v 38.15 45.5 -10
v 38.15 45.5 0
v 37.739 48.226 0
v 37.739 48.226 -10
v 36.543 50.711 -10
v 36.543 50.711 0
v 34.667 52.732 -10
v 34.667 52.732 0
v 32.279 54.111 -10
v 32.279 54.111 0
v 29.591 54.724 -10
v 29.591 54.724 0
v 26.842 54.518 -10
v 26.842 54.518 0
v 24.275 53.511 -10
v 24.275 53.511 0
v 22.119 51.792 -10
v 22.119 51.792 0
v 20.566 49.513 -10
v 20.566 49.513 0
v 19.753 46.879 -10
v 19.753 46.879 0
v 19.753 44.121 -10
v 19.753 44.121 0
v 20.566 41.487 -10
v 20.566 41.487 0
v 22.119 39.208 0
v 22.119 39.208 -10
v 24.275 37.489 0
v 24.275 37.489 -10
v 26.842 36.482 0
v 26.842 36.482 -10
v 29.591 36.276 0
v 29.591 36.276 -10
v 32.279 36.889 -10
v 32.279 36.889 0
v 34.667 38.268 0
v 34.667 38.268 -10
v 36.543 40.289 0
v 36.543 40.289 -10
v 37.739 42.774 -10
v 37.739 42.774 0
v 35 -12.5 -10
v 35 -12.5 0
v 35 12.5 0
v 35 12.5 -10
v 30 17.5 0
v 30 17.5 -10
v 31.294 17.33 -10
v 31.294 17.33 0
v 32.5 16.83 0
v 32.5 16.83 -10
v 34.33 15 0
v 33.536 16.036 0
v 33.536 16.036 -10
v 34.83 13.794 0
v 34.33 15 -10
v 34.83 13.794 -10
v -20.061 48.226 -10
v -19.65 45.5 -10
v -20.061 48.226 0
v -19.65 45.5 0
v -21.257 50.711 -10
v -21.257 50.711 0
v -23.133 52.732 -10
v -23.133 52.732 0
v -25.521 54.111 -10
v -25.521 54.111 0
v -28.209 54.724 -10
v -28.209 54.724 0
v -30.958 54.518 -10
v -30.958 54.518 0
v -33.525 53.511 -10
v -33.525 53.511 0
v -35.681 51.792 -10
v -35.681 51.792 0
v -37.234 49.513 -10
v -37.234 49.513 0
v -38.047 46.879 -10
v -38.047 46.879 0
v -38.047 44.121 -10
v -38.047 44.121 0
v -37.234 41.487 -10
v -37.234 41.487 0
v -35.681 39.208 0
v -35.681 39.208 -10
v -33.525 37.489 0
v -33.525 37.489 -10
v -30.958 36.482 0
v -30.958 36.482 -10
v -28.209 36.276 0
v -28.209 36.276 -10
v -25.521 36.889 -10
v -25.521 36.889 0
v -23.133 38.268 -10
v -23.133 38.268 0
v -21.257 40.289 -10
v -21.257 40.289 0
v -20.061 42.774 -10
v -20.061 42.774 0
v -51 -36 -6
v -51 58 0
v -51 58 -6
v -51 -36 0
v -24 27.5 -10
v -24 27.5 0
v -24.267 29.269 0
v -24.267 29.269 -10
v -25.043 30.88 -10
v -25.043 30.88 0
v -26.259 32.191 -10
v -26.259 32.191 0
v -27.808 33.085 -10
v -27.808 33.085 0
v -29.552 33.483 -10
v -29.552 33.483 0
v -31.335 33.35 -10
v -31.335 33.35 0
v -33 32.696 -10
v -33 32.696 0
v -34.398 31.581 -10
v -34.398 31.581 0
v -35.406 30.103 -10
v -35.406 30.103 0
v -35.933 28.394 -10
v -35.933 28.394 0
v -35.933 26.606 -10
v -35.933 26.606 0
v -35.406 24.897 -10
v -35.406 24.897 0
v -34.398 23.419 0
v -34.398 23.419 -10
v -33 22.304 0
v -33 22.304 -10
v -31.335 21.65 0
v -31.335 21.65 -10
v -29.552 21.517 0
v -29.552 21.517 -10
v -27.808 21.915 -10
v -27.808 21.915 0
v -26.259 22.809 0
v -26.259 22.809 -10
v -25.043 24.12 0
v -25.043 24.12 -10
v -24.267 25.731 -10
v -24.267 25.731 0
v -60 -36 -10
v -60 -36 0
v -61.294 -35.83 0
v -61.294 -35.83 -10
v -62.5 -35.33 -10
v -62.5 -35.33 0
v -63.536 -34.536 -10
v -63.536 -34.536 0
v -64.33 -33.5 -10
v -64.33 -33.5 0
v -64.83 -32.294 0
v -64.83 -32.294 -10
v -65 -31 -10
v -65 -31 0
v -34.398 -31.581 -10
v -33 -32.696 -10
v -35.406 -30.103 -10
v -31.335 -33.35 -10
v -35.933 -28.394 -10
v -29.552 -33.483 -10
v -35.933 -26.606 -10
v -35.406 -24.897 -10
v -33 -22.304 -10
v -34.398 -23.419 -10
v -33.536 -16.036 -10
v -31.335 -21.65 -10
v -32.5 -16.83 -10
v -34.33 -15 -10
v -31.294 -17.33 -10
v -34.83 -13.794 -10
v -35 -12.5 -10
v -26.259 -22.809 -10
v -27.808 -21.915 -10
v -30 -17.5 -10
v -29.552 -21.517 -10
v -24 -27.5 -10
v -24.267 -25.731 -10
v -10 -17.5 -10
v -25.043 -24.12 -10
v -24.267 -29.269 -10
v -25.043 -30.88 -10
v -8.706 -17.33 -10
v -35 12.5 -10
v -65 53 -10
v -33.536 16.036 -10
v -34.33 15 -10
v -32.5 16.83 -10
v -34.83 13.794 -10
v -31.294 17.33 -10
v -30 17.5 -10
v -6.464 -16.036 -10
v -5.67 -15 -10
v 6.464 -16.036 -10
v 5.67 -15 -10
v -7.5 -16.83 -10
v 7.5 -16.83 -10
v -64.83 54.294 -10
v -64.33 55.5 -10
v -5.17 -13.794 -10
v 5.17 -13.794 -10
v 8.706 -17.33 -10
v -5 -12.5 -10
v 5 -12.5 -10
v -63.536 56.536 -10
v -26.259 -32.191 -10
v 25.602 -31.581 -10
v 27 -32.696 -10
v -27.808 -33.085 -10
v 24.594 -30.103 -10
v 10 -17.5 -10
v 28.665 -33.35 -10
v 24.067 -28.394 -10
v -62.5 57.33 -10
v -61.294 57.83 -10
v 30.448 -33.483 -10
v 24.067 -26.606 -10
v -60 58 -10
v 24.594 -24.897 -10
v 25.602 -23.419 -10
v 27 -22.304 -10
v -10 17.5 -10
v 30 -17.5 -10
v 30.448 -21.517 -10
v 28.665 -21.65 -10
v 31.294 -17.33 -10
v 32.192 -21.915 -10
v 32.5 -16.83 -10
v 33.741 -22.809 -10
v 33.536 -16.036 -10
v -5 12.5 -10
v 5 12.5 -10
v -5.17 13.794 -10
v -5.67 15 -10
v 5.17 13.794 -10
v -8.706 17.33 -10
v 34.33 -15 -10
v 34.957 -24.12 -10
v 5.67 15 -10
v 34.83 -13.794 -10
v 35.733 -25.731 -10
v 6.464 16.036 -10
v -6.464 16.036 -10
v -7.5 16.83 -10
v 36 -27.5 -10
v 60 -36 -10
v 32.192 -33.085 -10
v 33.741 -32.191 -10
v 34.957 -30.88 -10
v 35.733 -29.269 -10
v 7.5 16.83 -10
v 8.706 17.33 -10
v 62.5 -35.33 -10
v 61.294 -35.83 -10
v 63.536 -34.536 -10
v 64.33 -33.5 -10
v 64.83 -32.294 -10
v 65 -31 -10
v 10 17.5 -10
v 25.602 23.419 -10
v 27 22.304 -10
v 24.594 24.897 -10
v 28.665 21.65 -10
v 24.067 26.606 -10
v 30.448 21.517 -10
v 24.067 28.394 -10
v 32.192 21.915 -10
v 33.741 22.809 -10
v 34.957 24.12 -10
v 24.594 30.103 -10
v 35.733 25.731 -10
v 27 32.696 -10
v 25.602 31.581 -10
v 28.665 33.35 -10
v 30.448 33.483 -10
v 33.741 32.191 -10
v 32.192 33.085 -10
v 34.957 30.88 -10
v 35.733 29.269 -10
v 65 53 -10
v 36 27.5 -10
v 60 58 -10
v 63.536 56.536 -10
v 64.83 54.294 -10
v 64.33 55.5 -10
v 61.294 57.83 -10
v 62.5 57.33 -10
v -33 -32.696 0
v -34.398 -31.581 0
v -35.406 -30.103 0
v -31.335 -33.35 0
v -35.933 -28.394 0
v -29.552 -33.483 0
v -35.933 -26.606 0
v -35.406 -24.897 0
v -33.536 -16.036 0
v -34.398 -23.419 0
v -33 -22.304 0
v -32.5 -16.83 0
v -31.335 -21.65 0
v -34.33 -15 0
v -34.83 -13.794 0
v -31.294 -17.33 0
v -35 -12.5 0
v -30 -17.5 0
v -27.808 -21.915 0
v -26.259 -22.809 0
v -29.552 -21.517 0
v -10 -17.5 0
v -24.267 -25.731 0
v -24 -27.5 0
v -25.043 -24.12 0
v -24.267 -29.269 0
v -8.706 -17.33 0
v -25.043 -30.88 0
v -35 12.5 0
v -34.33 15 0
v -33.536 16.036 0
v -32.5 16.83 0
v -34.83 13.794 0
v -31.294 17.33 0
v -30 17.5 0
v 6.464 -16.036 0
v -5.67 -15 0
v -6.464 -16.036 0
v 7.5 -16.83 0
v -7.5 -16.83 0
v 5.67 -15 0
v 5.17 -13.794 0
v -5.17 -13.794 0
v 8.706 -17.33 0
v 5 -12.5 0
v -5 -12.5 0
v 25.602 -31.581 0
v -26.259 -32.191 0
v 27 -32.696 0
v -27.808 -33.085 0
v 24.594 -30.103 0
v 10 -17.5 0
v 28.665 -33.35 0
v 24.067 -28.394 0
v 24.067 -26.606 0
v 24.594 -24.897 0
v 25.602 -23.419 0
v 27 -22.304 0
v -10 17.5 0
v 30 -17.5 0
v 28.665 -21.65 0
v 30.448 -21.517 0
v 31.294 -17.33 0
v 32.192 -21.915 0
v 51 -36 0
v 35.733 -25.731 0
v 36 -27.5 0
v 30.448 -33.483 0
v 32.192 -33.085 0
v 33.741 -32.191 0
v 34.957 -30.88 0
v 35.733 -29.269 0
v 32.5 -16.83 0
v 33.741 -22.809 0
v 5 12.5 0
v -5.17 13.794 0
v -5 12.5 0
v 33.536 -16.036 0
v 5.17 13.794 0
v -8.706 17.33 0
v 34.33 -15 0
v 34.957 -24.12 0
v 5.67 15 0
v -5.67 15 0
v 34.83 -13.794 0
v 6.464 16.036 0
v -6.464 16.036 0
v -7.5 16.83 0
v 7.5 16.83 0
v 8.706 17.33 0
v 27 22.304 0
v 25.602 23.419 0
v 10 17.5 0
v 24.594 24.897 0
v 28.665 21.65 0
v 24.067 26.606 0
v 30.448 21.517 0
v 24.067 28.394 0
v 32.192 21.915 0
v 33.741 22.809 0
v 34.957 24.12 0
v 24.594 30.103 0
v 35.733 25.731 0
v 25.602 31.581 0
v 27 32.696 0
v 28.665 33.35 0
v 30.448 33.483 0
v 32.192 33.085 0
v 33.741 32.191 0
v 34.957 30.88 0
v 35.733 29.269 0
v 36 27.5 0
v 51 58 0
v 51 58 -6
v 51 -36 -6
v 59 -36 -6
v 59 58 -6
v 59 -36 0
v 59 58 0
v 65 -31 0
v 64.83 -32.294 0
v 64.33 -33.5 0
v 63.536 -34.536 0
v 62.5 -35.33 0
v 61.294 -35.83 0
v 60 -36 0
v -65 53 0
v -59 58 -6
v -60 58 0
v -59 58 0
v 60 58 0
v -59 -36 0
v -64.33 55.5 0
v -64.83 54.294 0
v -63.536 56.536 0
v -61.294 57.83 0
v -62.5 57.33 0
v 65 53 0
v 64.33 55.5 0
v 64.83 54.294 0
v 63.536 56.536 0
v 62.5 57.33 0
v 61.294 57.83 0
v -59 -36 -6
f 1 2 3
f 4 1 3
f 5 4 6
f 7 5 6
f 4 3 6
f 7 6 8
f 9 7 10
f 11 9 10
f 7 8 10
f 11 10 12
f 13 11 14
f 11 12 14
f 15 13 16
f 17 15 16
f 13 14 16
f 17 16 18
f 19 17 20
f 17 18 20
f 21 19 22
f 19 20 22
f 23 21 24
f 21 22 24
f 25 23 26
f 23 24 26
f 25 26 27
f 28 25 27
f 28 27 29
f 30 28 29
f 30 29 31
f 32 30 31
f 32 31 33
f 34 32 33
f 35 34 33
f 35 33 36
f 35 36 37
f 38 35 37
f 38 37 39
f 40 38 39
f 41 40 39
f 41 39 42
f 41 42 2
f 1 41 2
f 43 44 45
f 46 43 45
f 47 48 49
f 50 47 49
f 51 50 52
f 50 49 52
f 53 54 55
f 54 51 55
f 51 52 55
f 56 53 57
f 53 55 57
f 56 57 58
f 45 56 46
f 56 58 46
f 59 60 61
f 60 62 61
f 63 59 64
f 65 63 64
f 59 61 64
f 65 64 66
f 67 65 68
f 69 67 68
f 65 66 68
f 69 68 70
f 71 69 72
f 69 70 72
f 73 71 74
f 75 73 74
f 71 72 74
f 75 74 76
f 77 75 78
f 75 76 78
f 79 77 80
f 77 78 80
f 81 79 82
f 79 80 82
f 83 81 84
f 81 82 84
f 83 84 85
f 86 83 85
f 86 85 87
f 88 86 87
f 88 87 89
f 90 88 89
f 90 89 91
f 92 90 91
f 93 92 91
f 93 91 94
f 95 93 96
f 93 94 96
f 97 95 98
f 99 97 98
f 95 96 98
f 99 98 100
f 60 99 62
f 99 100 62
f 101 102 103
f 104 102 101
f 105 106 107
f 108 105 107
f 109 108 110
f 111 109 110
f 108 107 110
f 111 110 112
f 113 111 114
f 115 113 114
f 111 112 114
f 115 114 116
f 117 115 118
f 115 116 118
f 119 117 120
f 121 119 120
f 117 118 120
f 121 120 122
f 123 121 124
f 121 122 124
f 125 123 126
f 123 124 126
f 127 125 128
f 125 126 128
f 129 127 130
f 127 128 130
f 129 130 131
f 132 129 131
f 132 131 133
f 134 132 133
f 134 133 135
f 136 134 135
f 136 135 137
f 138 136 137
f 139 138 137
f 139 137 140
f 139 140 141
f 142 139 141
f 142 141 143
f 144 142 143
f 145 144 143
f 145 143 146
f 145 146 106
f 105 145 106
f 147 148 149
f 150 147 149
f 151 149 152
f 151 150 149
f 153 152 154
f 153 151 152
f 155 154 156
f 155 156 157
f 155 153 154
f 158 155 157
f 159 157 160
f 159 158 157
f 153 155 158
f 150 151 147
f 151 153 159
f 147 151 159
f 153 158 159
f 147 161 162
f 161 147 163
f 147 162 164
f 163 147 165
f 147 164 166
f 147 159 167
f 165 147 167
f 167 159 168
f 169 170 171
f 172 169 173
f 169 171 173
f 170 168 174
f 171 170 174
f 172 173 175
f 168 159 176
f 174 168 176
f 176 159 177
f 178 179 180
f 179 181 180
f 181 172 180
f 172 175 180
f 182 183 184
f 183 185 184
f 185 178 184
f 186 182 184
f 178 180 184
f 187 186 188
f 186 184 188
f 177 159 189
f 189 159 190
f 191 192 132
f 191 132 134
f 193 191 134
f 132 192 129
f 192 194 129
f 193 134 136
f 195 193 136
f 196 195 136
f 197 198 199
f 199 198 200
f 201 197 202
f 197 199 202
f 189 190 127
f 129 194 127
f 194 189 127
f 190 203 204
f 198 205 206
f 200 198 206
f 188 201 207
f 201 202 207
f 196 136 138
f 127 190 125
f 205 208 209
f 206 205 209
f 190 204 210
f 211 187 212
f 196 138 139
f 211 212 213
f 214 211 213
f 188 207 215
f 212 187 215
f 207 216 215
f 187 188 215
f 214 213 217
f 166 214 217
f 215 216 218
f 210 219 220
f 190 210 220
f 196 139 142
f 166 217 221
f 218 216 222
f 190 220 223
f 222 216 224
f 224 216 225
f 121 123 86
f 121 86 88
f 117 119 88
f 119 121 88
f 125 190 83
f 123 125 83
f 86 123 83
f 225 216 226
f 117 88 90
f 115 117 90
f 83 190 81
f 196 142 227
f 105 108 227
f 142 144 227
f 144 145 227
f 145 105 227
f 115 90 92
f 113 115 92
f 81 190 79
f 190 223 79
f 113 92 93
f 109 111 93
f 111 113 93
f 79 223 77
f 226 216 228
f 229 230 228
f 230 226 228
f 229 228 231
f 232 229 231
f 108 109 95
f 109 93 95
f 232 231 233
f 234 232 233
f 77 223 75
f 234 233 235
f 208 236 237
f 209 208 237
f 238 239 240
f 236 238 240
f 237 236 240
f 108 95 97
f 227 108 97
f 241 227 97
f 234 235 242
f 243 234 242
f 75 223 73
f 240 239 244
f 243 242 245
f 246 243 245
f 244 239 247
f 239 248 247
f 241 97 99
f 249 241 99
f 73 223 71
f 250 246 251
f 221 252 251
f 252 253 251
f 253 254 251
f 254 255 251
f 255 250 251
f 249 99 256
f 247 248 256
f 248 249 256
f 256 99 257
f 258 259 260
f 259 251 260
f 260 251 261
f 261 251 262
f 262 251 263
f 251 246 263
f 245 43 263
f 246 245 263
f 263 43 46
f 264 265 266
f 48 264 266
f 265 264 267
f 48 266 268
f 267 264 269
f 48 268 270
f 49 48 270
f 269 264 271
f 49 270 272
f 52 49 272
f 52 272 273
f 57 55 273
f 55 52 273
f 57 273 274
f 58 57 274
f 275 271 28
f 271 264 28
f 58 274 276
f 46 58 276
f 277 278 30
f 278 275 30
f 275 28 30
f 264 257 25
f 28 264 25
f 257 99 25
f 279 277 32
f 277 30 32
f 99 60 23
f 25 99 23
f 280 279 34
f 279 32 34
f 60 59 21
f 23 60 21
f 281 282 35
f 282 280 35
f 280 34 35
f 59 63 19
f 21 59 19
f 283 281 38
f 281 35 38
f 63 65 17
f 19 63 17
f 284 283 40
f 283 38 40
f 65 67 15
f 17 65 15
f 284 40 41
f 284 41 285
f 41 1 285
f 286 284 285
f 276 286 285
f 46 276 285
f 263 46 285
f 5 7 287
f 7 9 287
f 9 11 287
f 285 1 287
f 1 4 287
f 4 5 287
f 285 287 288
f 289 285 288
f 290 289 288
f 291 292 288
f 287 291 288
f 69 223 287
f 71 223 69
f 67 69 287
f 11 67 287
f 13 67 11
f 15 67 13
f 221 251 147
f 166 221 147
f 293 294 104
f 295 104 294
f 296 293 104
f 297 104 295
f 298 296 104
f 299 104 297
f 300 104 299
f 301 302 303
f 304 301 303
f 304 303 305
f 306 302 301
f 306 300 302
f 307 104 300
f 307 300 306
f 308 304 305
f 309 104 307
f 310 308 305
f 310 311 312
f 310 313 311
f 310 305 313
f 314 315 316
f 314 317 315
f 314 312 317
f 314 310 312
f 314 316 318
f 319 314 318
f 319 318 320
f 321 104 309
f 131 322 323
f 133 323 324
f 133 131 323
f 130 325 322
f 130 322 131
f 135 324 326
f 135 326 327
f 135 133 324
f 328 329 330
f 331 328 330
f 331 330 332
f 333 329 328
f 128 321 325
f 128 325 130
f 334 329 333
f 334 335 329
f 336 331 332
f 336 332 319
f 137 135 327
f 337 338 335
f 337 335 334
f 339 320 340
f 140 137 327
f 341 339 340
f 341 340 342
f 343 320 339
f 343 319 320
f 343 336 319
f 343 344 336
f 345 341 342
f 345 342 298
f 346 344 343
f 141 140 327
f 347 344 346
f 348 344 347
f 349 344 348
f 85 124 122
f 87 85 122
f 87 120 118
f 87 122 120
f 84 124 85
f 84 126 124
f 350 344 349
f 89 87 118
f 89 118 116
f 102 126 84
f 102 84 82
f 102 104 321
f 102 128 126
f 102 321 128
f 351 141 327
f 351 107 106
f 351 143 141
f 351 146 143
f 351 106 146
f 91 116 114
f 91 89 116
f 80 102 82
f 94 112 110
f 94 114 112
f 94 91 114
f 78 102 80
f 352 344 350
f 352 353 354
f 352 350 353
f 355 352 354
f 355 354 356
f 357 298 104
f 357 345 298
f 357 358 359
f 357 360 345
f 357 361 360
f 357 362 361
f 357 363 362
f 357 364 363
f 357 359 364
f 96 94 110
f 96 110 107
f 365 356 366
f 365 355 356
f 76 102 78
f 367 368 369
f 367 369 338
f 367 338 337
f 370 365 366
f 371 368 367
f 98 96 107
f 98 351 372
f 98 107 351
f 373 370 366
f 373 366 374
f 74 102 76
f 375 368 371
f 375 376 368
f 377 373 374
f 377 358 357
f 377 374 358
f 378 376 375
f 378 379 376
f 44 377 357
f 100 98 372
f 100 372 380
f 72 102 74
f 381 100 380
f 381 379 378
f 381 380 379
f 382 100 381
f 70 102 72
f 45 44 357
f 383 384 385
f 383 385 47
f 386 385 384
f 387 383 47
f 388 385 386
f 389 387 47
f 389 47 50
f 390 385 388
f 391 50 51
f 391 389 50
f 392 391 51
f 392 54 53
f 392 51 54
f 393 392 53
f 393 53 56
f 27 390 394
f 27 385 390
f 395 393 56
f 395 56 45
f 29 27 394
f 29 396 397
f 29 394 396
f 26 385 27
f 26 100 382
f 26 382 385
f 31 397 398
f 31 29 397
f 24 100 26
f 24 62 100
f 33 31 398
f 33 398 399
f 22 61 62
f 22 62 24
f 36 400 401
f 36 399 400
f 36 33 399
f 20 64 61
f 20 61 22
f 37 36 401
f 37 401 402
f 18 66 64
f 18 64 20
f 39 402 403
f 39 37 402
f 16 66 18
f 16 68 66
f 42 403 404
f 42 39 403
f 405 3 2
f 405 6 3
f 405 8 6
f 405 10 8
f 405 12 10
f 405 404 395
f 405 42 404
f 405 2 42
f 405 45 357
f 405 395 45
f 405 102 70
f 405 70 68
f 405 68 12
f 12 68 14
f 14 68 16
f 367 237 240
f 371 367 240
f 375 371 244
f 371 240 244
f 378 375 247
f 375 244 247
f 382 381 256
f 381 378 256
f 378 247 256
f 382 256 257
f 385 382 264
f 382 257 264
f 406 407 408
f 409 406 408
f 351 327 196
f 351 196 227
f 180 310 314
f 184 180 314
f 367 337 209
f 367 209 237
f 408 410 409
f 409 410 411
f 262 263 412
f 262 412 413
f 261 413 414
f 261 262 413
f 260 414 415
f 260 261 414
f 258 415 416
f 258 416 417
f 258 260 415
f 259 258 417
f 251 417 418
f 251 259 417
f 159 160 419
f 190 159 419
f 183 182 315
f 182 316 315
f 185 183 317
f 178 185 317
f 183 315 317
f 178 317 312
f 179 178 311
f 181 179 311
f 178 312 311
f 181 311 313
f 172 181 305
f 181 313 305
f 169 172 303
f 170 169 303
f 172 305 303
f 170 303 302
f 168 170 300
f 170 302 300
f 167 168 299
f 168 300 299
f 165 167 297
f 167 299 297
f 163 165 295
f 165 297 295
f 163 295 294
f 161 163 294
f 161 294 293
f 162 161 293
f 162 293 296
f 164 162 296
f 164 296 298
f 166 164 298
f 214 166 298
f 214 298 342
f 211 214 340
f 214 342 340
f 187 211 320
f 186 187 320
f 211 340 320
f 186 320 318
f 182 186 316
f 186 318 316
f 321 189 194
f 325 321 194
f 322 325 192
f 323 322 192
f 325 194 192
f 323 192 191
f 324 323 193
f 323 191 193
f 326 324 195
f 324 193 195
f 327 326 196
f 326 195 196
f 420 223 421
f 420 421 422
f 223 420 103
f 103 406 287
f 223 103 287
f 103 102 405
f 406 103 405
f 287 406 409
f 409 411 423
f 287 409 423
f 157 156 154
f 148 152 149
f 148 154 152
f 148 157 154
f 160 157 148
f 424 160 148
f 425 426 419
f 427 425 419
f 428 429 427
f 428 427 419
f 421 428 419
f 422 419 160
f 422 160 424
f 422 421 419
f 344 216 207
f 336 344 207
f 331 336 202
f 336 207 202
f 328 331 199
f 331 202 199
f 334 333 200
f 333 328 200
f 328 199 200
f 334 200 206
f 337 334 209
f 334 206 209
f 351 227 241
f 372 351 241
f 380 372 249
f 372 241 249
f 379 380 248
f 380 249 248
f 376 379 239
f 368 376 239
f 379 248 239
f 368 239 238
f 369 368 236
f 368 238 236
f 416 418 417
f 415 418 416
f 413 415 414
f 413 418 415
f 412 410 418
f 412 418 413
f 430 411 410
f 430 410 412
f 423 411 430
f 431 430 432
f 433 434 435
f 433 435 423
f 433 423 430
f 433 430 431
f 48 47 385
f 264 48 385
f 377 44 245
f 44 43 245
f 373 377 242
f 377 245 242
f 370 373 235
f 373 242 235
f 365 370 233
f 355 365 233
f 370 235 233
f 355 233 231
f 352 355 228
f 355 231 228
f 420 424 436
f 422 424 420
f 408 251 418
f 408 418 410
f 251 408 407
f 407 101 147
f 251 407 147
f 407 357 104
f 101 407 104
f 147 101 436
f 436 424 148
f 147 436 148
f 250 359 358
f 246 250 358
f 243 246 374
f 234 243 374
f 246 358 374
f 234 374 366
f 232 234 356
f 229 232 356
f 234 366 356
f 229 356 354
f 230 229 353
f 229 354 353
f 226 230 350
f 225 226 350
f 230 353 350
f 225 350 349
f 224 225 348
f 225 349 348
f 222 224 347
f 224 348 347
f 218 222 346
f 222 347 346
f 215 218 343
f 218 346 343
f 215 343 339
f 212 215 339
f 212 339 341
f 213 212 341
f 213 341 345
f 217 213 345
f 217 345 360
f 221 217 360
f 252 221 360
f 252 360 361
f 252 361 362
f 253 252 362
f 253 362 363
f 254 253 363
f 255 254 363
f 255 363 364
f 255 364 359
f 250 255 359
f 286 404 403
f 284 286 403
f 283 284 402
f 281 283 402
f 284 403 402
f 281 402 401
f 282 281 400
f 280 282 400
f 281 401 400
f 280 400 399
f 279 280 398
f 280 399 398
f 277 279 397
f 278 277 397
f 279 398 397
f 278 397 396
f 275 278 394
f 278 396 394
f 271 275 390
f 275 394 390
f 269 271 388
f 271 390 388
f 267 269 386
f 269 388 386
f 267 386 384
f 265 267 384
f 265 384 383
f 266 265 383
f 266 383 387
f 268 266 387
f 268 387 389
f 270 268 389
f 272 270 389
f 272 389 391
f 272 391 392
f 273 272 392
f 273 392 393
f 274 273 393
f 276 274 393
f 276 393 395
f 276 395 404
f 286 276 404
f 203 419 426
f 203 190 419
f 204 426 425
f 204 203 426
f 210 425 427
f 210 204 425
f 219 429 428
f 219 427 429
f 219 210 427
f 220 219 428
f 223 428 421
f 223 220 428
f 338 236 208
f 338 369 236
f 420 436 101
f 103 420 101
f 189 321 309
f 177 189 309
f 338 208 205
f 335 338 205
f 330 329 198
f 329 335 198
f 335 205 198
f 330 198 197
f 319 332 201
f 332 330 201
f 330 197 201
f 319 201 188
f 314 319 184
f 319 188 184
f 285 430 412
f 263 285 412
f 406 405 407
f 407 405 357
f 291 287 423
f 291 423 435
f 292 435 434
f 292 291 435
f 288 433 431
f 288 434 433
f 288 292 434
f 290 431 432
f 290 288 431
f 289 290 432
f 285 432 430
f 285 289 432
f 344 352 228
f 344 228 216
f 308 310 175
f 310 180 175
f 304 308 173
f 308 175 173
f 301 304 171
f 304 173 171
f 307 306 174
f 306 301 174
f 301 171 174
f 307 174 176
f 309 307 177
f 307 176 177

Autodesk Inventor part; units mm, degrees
ref_plane "YZ Plane" through (0, 0, 0) normal (1, 0, 0) x (0, 1, 0)
ref_plane "XZ Plane" through (0, 0, 0) normal (0, 1, 0) x (-1, 0, 0)
ref_plane "XY Plane" through (0, 0, 0) normal (0, 0, 1) x (1, 0, 0)
sketch "Sketch1" plane through (0, 0, 0) normal (0, 0, 1) x (1, 0, 0)
  line L0 (-91, 0) -> (91, 0) construction
  line L1 (0, -94.2771) -> (0, 159.6624) construction
  circle A0 centre (-30, 27.5) radius 6
  circle A1 centre (30, 27.5) radius 6
  line L2 (-30, 27.5) -> (30, 27.5) construction
  line L3 (30, 27.5) -> (30, -27.5) construction
  line L4 (30, -27.5) -> (-30, -27.5) construction
  line L5 (-30, -27.5) -> (-30, 27.5) construction
  circle A2 centre (-30, -27.5) radius 6
  circle A3 centre (30, -27.5) radius 6
  line L6 (-30, 17.5) -> (-5, 17.5)
  line L7 (-5, 17.5) -> (-5, -17.5)
  line L8 (-5, -17.5) -> (-30, -17.5)
  circle A4 centre (-30, 0) radius 5
  circle A5 centre (-13, 7.5) radius 5.5
  circle A6 centre (-13, -7.5) radius 5.5
  line L9 (-45, 36) -> (45, 36)
  line L10 (45, 36) -> (45, -36)
  line L11 (45, -36) -> (-45, -36)
  line L12 (-45, -36) -> (-45, 36)
  circle A7 centre (-28.9, 45.5) radius 9.25
  circle A8 centre (28.9, 45.5) radius 9.25
  circle A9 centre (-28.9, -45.5) radius 9.25 construction
  circle A10 centre (28.9, -45.5) radius 9.25 construction
  line L13 (-30, 17.5) -> (-35, 17.5)
  line L14 (-35, 17.5) -> (-35, -17.5)
  line L15 (-35, -17.5) -> (-30, -17.5)
  line L16 (-45, 58) -> (45, 58)
  line L17 (45, 58) -> (45, 36)
  line L18 (45, 36) -> (-45, 36)
  line L19 (-45, 36) -> (-45, 58)
  line L20 (-45, -36) -> (45, -36)
  line L21 (45, -36) -> (45, -58) construction
  line L22 (45, -58) -> (-45, -58) construction
  line L23 (-45, -58) -> (-45, -36) construction
  line L24 (-45, -36) -> (-65, -36)
  line L25 (-65, -36) -> (-65, 58)
  line L26 (-65, 58) -> (-45, 58)
  line L27 (-45, 58) -> (-45, -36)
  line L28 (65, -36) -> (45, -36)
  line L29 (45, -36) -> (45, 58)
  line L30 (45, 58) -> (65, 58)
  line L31 (65, 58) -> (65, -36)
  line L32 (-51, -36) -> (-59, -36)
  line L33 (-59, -36) -> (-59, 58)
  line L34 (-59, 58) -> (-51, 58)
  line L35 (-51, 58) -> (-51, -36)
  line L36 (51, -36) -> (59, -36)
  line L37 (59, -36) -> (59, 58)
  line L38 (59, 58) -> (51, 58)
  line L39 (51, 58) -> (51, -36)
  point P0 (0, 0)
  point P1 (-55, 58)
  point P2 (55, 58)
  dimension "d2" = 12
  dimension "d3" = 60
  dimension "d4" = 55
  dimension "d5" = 10
  dimension "d6" = 25
  dimension "d7" = 10
  dimension "d8" = 17
  dimension "d9" = 11
  dimension "d10" = 15
  dimension "d12" = 18
  dimension "d13" = 18.5
  dimension "d14" = 90
  dimension "d15" = 72
  dimension "d18" = 30
  dimension "d25" = 10
  dimension "d26" = 10
  dimension "d28" = 22
  dimension "d35" = 57.8
  dimension "d36" = 20
  dimension "d37" = 8
extrude "Extrusion1" add sketch "Sketch1" against normal blind 10 contours A0 | A1 | A2 | A3 | A4 | L6 L7 L8 L15 L14 L13 | A5 | A6 | L19 L16 L17 L9 | L9 L10 L11 L12 | L12 L24 L35 L26 L19 | L17 L30 L39 L28 L10 | L24 L33 L26 L35 | L39 L30 L37 L28 | L24 L25 L26 L33 | L37 L30 L31 L28
extrude "Extrusion3" cut sketch "Sketch1" against normal through all contours A0 | A1 | A2 | A3
sketch "Sketch2" plane through (0, 0, 0) normal (0, 0, 1) x (1, 0, 0)
  line L0 (-78.9863, 0) -> (78.9863, 0) projected
  line L1 (0, -92.6147) -> (0, 159.3853) projected
  line L2 (-56.4188, 123.3853) -> (56.4188, 123.3853)
  line L3 (56.4188, 123.3853) -> (56.4188, 99.2325)
  line L4 (56.4188, -56.6147) -> (-56.4188, -56.6147)
  line L5 (-56.4188, -56.6147) -> (-56.4188, 99.2325)
  line L6 (-56.4188, 99.2325) -> (56.4188, 99.2325)
  line L7 (56.4188, 99.2325) -> (56.4188, -56.6147)
  line L8 (-56.4188, 99.2325) -> (-56.4188, 123.3853)
  point P0 (0, 0)
  dimension "d27" = 180
extrude "Extrusion4" cut sketch "Sketch1" against normal through all contours A4 | A5 | A6
extrude "Extrusion5" cut sketch "Sketch1" against normal through all contours L6 L7 L8 L15 L14 L13
mirror "Mirror2" about plane through (0, 0, 0) normal (1, 0, 0) of "Extrusion4", "Extrusion5"
fillet "Fillet4" radius 5 8 edges at (-35, 17.5, -5) (-5, 17.5, -5) (-35, -17.5, -5) (-5, -17.5, -5) (5, -17.5, -5) (5, 17.5, -5) (35, 17.5, -5) (35, -17.5, -5)
extrude "Extrusion6" cut sketch "Sketch1" against normal blind 6 contours L24 L33 L26 L35 | L39 L30 L37 L28
fillet "Fillet5" radius 5 4 edges at (-65, -36, -5) (65, -36, -5) (65, 58, -5) (-65, 58, -5)
properties part number "z plate bracket"
